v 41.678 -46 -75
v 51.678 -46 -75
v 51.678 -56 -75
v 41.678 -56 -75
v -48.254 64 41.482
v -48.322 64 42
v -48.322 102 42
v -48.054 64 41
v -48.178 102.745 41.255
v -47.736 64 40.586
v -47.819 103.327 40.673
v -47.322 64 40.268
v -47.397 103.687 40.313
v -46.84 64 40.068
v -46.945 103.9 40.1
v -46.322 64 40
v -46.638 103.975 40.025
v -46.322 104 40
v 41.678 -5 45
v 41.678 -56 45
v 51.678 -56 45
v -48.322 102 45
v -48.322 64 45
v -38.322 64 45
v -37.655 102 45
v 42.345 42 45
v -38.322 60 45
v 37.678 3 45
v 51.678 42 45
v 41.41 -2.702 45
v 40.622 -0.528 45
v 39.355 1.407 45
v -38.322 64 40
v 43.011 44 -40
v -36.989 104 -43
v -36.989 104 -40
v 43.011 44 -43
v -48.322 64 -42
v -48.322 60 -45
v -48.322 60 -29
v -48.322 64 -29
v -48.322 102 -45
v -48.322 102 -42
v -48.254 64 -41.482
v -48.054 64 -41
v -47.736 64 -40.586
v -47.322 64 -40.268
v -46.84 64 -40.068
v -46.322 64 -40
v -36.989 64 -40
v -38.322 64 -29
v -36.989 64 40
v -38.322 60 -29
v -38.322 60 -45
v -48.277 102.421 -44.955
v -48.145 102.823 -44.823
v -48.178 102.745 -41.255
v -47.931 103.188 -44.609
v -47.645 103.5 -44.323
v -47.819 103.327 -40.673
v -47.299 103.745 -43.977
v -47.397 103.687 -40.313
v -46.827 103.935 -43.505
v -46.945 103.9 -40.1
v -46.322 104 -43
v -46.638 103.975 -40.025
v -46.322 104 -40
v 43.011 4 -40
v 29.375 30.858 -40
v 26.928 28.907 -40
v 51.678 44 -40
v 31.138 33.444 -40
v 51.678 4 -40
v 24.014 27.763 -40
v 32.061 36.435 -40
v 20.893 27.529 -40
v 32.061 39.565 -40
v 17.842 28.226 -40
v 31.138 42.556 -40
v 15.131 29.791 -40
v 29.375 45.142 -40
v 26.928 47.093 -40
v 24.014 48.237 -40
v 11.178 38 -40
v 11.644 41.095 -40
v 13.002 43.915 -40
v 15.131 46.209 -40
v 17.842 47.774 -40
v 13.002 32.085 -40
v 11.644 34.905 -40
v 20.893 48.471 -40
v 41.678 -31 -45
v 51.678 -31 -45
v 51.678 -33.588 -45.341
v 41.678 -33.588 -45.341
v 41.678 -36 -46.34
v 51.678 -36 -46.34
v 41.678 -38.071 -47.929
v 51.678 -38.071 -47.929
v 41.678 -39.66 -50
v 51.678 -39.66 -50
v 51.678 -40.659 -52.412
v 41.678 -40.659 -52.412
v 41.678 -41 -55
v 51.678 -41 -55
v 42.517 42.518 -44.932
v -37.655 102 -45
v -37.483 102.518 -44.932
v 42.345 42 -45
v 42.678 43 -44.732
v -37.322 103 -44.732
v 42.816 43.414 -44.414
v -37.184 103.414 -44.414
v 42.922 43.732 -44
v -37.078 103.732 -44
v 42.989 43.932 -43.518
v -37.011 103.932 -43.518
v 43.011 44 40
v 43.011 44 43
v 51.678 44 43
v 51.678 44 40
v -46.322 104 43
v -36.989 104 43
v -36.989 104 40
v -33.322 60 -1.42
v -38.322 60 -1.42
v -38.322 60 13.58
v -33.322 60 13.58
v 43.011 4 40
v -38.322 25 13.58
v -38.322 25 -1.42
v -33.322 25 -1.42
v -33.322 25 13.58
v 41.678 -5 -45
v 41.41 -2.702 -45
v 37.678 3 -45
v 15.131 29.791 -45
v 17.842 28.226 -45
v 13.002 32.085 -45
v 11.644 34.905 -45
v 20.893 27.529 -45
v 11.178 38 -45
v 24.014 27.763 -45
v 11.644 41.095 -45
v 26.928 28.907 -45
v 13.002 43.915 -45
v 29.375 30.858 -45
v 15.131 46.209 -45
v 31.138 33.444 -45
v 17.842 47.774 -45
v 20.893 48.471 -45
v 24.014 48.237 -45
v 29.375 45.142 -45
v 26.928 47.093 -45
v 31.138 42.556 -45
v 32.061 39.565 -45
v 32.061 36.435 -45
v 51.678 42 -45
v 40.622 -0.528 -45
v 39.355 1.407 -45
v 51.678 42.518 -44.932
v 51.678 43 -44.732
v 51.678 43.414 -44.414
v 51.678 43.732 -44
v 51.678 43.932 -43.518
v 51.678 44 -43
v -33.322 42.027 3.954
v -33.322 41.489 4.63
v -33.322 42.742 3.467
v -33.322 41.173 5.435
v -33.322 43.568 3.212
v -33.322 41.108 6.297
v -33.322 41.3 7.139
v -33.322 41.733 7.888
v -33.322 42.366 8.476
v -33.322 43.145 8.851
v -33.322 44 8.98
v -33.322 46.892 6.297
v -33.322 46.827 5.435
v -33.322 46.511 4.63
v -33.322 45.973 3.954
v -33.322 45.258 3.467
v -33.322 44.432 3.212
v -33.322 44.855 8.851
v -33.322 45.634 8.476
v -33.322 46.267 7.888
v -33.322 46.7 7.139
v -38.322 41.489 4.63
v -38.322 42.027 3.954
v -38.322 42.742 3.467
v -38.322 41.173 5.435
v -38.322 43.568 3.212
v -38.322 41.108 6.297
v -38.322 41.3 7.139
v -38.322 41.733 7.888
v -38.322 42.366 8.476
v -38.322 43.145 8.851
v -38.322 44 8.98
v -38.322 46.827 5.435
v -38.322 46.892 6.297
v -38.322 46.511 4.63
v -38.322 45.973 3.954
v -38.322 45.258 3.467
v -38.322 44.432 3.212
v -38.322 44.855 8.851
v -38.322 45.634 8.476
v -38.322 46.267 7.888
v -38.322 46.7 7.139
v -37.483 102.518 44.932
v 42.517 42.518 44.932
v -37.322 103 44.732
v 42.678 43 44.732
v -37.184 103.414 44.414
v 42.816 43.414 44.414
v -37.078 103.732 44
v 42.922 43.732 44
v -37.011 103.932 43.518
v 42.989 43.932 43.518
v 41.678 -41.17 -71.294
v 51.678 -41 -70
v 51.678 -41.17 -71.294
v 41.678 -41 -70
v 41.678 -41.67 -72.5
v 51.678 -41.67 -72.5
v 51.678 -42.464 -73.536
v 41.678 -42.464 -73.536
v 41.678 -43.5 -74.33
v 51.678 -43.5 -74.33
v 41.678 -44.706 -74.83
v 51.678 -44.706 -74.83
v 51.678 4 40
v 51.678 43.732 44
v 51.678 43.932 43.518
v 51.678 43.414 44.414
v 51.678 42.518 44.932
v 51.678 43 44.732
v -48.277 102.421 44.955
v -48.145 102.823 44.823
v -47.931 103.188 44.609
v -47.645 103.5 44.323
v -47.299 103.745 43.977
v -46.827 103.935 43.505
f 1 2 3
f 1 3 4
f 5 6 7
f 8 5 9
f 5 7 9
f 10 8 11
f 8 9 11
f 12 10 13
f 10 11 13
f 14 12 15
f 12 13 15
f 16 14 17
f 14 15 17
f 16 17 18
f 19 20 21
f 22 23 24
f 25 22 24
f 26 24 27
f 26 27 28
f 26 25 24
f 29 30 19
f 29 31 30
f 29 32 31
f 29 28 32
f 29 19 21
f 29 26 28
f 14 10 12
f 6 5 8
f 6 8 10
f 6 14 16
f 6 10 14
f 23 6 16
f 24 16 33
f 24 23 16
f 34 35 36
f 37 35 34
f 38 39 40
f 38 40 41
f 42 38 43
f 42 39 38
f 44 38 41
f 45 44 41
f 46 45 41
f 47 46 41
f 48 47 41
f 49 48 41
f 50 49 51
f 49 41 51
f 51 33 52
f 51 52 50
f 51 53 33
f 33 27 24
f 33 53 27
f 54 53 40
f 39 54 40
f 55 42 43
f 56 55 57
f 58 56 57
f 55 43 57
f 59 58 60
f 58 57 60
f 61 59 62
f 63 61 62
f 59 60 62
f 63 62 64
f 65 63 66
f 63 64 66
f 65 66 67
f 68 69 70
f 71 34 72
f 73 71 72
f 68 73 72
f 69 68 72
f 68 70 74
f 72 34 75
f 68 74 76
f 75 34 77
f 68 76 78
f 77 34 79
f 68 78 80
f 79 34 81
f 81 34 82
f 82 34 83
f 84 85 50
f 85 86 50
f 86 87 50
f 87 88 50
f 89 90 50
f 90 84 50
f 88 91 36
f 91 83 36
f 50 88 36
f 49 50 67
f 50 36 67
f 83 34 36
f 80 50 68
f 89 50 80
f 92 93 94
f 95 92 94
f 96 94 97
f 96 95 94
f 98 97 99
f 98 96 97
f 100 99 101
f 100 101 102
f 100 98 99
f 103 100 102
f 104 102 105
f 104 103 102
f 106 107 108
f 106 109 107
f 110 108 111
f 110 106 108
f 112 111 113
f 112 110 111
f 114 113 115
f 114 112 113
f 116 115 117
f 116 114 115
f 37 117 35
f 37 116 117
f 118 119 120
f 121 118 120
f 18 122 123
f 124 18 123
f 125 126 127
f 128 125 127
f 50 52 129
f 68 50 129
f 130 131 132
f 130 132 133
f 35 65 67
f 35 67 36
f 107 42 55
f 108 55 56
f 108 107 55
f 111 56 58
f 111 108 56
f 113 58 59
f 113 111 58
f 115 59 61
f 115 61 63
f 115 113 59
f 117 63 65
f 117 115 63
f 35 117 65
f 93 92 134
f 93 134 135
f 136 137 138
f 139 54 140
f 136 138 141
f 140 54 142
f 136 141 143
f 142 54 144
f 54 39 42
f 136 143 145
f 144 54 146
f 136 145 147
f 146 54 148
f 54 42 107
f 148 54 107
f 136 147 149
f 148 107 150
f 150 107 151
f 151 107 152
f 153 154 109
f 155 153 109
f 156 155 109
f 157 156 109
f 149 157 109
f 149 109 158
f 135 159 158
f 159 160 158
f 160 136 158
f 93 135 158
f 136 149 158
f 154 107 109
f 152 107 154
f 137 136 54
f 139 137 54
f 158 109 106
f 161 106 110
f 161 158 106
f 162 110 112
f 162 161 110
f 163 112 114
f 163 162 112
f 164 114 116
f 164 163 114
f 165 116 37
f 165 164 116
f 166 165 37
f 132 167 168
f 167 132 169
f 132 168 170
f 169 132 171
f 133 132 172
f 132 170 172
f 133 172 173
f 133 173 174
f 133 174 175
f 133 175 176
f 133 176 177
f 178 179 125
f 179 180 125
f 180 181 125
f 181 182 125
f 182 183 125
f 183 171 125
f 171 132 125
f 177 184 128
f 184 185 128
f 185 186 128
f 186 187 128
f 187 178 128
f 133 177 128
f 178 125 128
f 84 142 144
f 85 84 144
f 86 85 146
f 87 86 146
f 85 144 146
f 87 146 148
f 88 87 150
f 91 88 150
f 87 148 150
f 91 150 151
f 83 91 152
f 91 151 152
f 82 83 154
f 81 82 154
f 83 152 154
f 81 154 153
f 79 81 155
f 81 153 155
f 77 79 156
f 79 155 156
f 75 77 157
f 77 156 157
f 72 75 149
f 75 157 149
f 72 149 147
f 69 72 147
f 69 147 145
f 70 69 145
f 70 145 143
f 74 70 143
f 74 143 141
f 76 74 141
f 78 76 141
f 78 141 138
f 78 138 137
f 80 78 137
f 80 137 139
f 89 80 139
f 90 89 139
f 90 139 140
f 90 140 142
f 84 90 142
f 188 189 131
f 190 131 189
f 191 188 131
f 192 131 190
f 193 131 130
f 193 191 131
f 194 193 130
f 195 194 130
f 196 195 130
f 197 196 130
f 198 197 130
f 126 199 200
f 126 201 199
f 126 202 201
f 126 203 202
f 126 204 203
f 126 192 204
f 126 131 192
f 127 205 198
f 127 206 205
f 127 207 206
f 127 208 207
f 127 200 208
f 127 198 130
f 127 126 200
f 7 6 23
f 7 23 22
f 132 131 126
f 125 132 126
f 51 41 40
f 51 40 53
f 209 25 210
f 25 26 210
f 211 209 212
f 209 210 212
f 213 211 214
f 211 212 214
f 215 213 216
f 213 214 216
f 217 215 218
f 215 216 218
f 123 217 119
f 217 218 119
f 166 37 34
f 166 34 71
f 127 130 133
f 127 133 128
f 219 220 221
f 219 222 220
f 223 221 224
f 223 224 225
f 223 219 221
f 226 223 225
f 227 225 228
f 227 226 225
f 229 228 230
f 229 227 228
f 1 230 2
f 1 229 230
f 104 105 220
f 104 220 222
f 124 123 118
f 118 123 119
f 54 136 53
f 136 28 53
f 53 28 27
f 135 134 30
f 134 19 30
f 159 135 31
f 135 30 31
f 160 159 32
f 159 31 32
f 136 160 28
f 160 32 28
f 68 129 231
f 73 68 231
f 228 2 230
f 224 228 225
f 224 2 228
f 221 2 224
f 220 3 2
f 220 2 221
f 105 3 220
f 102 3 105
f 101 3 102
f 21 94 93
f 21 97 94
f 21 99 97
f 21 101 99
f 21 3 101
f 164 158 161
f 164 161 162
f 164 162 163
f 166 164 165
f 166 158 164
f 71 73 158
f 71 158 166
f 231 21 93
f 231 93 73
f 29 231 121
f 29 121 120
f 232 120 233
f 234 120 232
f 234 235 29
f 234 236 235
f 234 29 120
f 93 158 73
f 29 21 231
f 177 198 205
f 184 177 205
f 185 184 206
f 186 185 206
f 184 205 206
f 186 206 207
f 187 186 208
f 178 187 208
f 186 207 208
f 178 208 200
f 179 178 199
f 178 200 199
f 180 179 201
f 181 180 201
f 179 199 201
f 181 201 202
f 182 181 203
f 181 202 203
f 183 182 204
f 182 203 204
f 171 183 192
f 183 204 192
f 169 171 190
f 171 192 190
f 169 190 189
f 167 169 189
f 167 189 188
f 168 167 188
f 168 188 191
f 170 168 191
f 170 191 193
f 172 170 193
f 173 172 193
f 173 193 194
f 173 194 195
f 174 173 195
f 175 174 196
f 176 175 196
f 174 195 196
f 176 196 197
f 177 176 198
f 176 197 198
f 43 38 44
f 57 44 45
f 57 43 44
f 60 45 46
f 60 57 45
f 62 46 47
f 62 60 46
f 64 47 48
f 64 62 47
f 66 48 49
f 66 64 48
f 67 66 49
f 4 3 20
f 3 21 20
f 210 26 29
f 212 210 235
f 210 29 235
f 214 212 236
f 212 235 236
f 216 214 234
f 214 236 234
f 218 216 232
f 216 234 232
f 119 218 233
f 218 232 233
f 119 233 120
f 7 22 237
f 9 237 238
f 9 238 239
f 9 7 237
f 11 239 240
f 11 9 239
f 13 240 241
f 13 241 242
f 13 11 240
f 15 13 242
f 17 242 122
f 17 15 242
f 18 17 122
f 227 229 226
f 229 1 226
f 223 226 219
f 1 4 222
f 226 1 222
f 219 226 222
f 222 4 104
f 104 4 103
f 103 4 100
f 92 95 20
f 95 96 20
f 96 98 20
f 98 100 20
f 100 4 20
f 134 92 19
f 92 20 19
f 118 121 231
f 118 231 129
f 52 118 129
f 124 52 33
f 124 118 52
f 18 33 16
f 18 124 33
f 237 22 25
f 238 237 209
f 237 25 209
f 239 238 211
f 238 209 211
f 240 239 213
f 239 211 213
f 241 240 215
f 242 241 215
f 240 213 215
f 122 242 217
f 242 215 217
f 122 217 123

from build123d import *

# Parameters (mm, degrees)
BOSS_EXTRUDE1_DEPTH = 45
BOSS_EXTRUDE2_DEPTH = 5
CUT_EXTRUDE1_REACH  = 148.924
SKETCH3_R           = 10.5
SKETCH8_W           = 10
SKETCH8_H           = 56
BOSS_EXTRUDE4_DEPTH = 90
FILLET2_R           = 10
FILLET3_R           = 2
SKETCH9_W           = 10
SKETCH9_H           = 4
CUT_EXTRUDE2_DEPTH  = 74
SKETCH10_W          = 15
SKETCH10_H          = 35
SKETCH10_R          = 2.9
BOSS_EXTRUDE5_DEPTH = 5
SKETCH11_W          = 10
SKETCH11_H          = 15
BOSS_EXTRUDE6_DEPTH = 30
FILLET4_R           = 10
FILLET5_R           = 5


with BuildPart() as part:
    # Sketch1 → Boss-Extrude1 (new, symmetric)
    with BuildSketch(Plane.XY):
        Polygon((41.677960524, 0), (-38.322039476, 60), (-48.322039476, 60), (-48.322039476, 64), (-36.988706143, 64), (43.011293857, 4), (51.677960524, 4), (51.677960524, 0), align=None)
    extrude(amount=BOSS_EXTRUDE1_DEPTH, both=True)

    # Sketch2 → Boss-Extrude2 (add)
    with BuildSketch(Plane.XY.offset(45)):
        Polygon((-48.322039476, 64), (-48.322039476, 104), (-36.988706143, 104), (43.011293857, 44), (51.677960524, 44), (51.677960524, 4), (43.011293857, 4), (-36.988706143, 64), align=None)
    boss_extrude2 = extrude(amount=-BOSS_EXTRUDE2_DEPTH)

    # Mirror1: Boss-Extrude2 across plane
    add(boss_extrude2.mirror(Plane.XY))

    # Sketch3 → Cut-Extrude1 (cut, up to next)
    with BuildSketch(Plane(origin=(0, 0, -45), x_dir=(-1, 0, 0), z_dir=(0, 0, -1)), mode=Mode.PRIVATE) as cut_extrude1_sk1:
        with Locations((-21.677960524, 38)):
            Circle(SKETCH3_R)
    cut_extrude1_tool1 = extrude(cut_extrude1_sk1.sketch, amount=-CUT_EXTRUDE1_REACH, mode=Mode.PRIVATE) & part.part
    add(cut_extrude1_tool1.solids().sort_by_distance((21.677961, 38, -45))[0], mode=Mode.SUBTRACT)

    # Sketch8 → Boss-Extrude4 (add)
    with BuildSketch(Plane.XY.offset(45)):
        with Locations((46.677960524, -28)):
            Rectangle(SKETCH8_W, SKETCH8_H)
    extrude(amount=-BOSS_EXTRUDE4_DEPTH)

    # Fillet2
    fillet2_edges = [part.edges().sort_by_distance(p)[0] for p in [
        (41.677960524, 0, 0),
    ]]
    fillet(fillet2_edges, radius=FILLET2_R)

    # Fillet3
    fillet3_edges = [part.edges().sort_by_distance(p)[0] for p in [
        (-48.322039476, 84, 40),
        (-48.322039476, 104, 42.5),
        (47.344627191, 44, 45),
        (3.011293857, 74, 45),
        (-42.655372809, 104, 45),
        (47.344627191, 44, -45),
        (3.011293857, 74, -45),
        (-42.655372809, 104, -45),
        (-48.322039476, 104, -42.5),
        (-48.322039476, 84, -40),
    ]]
    fillet(fillet3_edges, radius=FILLET3_R)

    # Sketch9 → Cut-Extrude2 (cut)
    with BuildSketch(Plane.XY.offset(45)):
        with Locations((-43.322039476, 62)):
            Rectangle(SKETCH9_W, SKETCH9_H)
    extrude(amount=-CUT_EXTRUDE2_DEPTH, mode=Mode.SUBTRACT)

    # Sketch11 → Boss-Extrude6 (add)
    with BuildSketch(Plane(origin=(0, 0, -45), x_dir=(-1, 0, 0), z_dir=(0, 0, -1))):
        with Locations((-46.677960524, -48.5)):
            Rectangle(SKETCH11_W, SKETCH11_H)
    extrude(amount=BOSS_EXTRUDE6_DEPTH)

    # Fillet4
    fillet4_edges = [part.edges().sort_by_distance(p)[0] for p in [
        (46.677960524, -41, -45),
    ]]
    fillet(fillet4_edges, radius=FILLET4_R)

    # Fillet5
    fillet5_edges = [part.edges().sort_by_distance(p)[0] for p in [
        (46.677960524, -41, -75),
    ]]
    fillet(fillet5_edges, radius=FILLET5_R)


with BuildPart() as body_2:
    # Sketch10 → Boss-Extrude5 (new body)
    with BuildSketch(Plane.ZY.offset(38.322039476)):
        with Locations((6.08, 42.5)):
            Rectangle(SKETCH10_W, SKETCH10_H)
        with Locations((6.08, 44)):
            Circle(SKETCH10_R, mode=Mode.SUBTRACT)
    extrude(amount=-BOSS_EXTRUDE5_DEPTH)


solid = Compound([part.part, body_2.part])
